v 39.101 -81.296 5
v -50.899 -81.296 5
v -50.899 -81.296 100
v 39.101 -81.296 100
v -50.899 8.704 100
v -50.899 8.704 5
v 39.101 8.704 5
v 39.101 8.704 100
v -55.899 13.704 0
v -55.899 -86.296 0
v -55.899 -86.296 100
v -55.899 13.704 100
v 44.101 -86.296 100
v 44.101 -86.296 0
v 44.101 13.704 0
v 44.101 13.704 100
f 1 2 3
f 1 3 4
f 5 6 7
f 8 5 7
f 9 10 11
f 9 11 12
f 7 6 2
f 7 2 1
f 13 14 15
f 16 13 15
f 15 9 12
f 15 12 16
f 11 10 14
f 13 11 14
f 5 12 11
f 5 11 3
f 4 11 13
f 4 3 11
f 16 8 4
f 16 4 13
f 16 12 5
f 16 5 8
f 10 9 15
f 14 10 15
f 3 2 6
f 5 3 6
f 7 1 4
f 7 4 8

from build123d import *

# Parameters (mm, degrees)
SKETCH1_W           = 100
SKETCH1_H           = 100
BOSS_EXTRUDE1_DEPTH = 100
SHELL1_T            = -5


with BuildPart() as part:
    # Sketch1 → Boss-Extrude1 (new body)
    with BuildSketch(Plane.XY):
        with Locations((-5.898502638, -36.295960273)):
            Rectangle(SKETCH1_W, SKETCH1_H)
    extrude(amount=BOSS_EXTRUDE1_DEPTH)

    # Shell1
    shell1_openings = [part.faces().sort_by_distance(p)[0] for p in [
        (-5.898502638, -36.295960273, 100),
    ]]
    offset(amount=SHELL1_T, openings=shell1_openings, kind=Kind.INTERSECTION)


solid = part.part
